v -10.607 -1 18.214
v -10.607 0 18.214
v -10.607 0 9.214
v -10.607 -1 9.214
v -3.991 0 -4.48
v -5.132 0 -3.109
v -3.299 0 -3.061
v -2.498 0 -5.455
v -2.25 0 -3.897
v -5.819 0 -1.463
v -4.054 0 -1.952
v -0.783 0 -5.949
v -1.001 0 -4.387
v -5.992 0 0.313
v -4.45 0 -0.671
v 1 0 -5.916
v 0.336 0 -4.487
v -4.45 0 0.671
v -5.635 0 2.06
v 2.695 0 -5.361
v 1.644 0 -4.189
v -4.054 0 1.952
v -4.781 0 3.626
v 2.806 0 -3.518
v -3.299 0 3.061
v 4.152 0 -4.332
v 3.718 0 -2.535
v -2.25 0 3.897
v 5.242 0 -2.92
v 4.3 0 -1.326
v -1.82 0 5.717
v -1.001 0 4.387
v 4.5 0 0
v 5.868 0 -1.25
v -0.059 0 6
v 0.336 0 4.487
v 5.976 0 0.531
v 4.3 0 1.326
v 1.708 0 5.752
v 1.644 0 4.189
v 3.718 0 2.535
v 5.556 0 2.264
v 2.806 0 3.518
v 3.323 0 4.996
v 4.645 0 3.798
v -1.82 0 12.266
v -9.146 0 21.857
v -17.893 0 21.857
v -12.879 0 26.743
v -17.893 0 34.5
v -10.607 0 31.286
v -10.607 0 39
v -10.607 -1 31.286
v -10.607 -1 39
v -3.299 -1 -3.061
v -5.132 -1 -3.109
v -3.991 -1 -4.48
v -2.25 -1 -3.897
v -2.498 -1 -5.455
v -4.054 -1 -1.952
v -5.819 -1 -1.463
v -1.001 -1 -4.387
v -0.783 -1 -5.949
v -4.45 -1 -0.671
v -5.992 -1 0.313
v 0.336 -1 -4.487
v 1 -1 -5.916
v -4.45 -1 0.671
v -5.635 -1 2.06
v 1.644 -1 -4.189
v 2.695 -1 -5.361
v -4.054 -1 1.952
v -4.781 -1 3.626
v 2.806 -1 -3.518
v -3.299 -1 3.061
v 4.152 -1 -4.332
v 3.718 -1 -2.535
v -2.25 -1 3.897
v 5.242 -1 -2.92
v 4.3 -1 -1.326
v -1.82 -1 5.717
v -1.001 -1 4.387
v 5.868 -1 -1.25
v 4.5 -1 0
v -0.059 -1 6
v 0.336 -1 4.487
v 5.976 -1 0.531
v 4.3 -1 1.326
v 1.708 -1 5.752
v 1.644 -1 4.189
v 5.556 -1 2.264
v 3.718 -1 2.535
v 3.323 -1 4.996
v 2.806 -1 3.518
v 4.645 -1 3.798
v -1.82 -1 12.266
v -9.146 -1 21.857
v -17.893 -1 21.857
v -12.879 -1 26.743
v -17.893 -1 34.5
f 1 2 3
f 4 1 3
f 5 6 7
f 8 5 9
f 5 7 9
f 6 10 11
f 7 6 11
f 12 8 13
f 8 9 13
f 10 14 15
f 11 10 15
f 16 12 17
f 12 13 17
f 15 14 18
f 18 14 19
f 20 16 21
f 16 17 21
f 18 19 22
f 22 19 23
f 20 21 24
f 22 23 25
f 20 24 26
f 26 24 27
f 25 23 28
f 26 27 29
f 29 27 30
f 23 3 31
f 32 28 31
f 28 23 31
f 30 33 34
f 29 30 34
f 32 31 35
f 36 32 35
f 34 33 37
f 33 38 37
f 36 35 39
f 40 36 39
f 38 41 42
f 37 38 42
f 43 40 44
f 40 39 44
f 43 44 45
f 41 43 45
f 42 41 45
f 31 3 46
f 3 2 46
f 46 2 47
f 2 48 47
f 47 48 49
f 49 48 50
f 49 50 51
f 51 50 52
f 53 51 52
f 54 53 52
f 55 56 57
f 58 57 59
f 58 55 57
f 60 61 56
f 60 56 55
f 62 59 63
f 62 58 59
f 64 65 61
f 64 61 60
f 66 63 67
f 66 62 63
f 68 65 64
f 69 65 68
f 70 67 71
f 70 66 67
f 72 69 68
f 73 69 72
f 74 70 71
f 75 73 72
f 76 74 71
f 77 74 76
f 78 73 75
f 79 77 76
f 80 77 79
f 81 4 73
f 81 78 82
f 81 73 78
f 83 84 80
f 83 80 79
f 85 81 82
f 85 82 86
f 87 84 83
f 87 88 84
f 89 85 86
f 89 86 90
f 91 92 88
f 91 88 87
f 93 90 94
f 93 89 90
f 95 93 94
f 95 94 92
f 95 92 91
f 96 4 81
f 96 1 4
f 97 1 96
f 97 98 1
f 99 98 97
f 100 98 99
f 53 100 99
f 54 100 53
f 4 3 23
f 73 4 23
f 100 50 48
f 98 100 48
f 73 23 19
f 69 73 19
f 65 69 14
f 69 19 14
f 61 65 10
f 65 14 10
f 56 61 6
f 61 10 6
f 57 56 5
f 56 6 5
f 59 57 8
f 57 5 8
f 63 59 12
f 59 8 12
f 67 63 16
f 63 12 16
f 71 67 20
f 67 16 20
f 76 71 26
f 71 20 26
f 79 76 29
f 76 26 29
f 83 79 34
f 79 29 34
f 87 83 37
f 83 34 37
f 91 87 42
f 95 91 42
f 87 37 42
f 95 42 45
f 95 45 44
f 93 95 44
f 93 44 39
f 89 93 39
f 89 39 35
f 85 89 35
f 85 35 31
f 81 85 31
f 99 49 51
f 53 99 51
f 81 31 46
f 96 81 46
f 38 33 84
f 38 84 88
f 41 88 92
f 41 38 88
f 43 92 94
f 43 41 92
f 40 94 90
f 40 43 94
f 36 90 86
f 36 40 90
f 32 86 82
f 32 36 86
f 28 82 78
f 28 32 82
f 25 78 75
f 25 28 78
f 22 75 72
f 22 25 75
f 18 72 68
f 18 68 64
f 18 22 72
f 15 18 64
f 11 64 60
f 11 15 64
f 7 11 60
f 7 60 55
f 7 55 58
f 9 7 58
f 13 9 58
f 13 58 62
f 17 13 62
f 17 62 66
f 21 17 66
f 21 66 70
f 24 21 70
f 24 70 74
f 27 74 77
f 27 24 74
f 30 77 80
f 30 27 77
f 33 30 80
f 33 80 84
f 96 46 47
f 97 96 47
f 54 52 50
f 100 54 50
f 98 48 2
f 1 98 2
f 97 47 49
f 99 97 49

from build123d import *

# Parameters (mm, degrees)
F0_R     = 4.5
F1_DEPTH = 1


with BuildPart() as f1:
    # F0 (on Front) → F1 (new body)
    with BuildSketch(Plane.XZ):
        with BuildLine():
            Line((-10.607143, 9.214287), (-4.78051, 3.625841))
            ThreePointArc((-4.78051, 3.625841), (3.461877, -4.900552), (-1.819782, 5.717377))
            Line((-1.819782, 5.717377), (-1.819782, 12.266138))
            Line((-1.819782, 12.266138), (-9.146367, 21.857144))
            Line((-9.146367, 21.857144), (-12.878571, 26.742858))
            Line((-12.878571, 26.742858), (-10.607143, 31.285714))
            Line((-10.607143, 31.285714), (-10.607143, 39.000001))
            Line((-10.607143, 39.000001), (-17.892858, 34.500003))
            Line((-17.892858, 34.500003), (-17.892858, 21.857144))
            Line((-17.892858, 21.857144), (-10.607143, 18.214287))
            Line((-10.607143, 18.214287), (-10.607143, 9.214287))
        make_face()
        Circle(F0_R, mode=Mode.SUBTRACT)
    extrude(amount=F1_DEPTH)


solid = f1.part
